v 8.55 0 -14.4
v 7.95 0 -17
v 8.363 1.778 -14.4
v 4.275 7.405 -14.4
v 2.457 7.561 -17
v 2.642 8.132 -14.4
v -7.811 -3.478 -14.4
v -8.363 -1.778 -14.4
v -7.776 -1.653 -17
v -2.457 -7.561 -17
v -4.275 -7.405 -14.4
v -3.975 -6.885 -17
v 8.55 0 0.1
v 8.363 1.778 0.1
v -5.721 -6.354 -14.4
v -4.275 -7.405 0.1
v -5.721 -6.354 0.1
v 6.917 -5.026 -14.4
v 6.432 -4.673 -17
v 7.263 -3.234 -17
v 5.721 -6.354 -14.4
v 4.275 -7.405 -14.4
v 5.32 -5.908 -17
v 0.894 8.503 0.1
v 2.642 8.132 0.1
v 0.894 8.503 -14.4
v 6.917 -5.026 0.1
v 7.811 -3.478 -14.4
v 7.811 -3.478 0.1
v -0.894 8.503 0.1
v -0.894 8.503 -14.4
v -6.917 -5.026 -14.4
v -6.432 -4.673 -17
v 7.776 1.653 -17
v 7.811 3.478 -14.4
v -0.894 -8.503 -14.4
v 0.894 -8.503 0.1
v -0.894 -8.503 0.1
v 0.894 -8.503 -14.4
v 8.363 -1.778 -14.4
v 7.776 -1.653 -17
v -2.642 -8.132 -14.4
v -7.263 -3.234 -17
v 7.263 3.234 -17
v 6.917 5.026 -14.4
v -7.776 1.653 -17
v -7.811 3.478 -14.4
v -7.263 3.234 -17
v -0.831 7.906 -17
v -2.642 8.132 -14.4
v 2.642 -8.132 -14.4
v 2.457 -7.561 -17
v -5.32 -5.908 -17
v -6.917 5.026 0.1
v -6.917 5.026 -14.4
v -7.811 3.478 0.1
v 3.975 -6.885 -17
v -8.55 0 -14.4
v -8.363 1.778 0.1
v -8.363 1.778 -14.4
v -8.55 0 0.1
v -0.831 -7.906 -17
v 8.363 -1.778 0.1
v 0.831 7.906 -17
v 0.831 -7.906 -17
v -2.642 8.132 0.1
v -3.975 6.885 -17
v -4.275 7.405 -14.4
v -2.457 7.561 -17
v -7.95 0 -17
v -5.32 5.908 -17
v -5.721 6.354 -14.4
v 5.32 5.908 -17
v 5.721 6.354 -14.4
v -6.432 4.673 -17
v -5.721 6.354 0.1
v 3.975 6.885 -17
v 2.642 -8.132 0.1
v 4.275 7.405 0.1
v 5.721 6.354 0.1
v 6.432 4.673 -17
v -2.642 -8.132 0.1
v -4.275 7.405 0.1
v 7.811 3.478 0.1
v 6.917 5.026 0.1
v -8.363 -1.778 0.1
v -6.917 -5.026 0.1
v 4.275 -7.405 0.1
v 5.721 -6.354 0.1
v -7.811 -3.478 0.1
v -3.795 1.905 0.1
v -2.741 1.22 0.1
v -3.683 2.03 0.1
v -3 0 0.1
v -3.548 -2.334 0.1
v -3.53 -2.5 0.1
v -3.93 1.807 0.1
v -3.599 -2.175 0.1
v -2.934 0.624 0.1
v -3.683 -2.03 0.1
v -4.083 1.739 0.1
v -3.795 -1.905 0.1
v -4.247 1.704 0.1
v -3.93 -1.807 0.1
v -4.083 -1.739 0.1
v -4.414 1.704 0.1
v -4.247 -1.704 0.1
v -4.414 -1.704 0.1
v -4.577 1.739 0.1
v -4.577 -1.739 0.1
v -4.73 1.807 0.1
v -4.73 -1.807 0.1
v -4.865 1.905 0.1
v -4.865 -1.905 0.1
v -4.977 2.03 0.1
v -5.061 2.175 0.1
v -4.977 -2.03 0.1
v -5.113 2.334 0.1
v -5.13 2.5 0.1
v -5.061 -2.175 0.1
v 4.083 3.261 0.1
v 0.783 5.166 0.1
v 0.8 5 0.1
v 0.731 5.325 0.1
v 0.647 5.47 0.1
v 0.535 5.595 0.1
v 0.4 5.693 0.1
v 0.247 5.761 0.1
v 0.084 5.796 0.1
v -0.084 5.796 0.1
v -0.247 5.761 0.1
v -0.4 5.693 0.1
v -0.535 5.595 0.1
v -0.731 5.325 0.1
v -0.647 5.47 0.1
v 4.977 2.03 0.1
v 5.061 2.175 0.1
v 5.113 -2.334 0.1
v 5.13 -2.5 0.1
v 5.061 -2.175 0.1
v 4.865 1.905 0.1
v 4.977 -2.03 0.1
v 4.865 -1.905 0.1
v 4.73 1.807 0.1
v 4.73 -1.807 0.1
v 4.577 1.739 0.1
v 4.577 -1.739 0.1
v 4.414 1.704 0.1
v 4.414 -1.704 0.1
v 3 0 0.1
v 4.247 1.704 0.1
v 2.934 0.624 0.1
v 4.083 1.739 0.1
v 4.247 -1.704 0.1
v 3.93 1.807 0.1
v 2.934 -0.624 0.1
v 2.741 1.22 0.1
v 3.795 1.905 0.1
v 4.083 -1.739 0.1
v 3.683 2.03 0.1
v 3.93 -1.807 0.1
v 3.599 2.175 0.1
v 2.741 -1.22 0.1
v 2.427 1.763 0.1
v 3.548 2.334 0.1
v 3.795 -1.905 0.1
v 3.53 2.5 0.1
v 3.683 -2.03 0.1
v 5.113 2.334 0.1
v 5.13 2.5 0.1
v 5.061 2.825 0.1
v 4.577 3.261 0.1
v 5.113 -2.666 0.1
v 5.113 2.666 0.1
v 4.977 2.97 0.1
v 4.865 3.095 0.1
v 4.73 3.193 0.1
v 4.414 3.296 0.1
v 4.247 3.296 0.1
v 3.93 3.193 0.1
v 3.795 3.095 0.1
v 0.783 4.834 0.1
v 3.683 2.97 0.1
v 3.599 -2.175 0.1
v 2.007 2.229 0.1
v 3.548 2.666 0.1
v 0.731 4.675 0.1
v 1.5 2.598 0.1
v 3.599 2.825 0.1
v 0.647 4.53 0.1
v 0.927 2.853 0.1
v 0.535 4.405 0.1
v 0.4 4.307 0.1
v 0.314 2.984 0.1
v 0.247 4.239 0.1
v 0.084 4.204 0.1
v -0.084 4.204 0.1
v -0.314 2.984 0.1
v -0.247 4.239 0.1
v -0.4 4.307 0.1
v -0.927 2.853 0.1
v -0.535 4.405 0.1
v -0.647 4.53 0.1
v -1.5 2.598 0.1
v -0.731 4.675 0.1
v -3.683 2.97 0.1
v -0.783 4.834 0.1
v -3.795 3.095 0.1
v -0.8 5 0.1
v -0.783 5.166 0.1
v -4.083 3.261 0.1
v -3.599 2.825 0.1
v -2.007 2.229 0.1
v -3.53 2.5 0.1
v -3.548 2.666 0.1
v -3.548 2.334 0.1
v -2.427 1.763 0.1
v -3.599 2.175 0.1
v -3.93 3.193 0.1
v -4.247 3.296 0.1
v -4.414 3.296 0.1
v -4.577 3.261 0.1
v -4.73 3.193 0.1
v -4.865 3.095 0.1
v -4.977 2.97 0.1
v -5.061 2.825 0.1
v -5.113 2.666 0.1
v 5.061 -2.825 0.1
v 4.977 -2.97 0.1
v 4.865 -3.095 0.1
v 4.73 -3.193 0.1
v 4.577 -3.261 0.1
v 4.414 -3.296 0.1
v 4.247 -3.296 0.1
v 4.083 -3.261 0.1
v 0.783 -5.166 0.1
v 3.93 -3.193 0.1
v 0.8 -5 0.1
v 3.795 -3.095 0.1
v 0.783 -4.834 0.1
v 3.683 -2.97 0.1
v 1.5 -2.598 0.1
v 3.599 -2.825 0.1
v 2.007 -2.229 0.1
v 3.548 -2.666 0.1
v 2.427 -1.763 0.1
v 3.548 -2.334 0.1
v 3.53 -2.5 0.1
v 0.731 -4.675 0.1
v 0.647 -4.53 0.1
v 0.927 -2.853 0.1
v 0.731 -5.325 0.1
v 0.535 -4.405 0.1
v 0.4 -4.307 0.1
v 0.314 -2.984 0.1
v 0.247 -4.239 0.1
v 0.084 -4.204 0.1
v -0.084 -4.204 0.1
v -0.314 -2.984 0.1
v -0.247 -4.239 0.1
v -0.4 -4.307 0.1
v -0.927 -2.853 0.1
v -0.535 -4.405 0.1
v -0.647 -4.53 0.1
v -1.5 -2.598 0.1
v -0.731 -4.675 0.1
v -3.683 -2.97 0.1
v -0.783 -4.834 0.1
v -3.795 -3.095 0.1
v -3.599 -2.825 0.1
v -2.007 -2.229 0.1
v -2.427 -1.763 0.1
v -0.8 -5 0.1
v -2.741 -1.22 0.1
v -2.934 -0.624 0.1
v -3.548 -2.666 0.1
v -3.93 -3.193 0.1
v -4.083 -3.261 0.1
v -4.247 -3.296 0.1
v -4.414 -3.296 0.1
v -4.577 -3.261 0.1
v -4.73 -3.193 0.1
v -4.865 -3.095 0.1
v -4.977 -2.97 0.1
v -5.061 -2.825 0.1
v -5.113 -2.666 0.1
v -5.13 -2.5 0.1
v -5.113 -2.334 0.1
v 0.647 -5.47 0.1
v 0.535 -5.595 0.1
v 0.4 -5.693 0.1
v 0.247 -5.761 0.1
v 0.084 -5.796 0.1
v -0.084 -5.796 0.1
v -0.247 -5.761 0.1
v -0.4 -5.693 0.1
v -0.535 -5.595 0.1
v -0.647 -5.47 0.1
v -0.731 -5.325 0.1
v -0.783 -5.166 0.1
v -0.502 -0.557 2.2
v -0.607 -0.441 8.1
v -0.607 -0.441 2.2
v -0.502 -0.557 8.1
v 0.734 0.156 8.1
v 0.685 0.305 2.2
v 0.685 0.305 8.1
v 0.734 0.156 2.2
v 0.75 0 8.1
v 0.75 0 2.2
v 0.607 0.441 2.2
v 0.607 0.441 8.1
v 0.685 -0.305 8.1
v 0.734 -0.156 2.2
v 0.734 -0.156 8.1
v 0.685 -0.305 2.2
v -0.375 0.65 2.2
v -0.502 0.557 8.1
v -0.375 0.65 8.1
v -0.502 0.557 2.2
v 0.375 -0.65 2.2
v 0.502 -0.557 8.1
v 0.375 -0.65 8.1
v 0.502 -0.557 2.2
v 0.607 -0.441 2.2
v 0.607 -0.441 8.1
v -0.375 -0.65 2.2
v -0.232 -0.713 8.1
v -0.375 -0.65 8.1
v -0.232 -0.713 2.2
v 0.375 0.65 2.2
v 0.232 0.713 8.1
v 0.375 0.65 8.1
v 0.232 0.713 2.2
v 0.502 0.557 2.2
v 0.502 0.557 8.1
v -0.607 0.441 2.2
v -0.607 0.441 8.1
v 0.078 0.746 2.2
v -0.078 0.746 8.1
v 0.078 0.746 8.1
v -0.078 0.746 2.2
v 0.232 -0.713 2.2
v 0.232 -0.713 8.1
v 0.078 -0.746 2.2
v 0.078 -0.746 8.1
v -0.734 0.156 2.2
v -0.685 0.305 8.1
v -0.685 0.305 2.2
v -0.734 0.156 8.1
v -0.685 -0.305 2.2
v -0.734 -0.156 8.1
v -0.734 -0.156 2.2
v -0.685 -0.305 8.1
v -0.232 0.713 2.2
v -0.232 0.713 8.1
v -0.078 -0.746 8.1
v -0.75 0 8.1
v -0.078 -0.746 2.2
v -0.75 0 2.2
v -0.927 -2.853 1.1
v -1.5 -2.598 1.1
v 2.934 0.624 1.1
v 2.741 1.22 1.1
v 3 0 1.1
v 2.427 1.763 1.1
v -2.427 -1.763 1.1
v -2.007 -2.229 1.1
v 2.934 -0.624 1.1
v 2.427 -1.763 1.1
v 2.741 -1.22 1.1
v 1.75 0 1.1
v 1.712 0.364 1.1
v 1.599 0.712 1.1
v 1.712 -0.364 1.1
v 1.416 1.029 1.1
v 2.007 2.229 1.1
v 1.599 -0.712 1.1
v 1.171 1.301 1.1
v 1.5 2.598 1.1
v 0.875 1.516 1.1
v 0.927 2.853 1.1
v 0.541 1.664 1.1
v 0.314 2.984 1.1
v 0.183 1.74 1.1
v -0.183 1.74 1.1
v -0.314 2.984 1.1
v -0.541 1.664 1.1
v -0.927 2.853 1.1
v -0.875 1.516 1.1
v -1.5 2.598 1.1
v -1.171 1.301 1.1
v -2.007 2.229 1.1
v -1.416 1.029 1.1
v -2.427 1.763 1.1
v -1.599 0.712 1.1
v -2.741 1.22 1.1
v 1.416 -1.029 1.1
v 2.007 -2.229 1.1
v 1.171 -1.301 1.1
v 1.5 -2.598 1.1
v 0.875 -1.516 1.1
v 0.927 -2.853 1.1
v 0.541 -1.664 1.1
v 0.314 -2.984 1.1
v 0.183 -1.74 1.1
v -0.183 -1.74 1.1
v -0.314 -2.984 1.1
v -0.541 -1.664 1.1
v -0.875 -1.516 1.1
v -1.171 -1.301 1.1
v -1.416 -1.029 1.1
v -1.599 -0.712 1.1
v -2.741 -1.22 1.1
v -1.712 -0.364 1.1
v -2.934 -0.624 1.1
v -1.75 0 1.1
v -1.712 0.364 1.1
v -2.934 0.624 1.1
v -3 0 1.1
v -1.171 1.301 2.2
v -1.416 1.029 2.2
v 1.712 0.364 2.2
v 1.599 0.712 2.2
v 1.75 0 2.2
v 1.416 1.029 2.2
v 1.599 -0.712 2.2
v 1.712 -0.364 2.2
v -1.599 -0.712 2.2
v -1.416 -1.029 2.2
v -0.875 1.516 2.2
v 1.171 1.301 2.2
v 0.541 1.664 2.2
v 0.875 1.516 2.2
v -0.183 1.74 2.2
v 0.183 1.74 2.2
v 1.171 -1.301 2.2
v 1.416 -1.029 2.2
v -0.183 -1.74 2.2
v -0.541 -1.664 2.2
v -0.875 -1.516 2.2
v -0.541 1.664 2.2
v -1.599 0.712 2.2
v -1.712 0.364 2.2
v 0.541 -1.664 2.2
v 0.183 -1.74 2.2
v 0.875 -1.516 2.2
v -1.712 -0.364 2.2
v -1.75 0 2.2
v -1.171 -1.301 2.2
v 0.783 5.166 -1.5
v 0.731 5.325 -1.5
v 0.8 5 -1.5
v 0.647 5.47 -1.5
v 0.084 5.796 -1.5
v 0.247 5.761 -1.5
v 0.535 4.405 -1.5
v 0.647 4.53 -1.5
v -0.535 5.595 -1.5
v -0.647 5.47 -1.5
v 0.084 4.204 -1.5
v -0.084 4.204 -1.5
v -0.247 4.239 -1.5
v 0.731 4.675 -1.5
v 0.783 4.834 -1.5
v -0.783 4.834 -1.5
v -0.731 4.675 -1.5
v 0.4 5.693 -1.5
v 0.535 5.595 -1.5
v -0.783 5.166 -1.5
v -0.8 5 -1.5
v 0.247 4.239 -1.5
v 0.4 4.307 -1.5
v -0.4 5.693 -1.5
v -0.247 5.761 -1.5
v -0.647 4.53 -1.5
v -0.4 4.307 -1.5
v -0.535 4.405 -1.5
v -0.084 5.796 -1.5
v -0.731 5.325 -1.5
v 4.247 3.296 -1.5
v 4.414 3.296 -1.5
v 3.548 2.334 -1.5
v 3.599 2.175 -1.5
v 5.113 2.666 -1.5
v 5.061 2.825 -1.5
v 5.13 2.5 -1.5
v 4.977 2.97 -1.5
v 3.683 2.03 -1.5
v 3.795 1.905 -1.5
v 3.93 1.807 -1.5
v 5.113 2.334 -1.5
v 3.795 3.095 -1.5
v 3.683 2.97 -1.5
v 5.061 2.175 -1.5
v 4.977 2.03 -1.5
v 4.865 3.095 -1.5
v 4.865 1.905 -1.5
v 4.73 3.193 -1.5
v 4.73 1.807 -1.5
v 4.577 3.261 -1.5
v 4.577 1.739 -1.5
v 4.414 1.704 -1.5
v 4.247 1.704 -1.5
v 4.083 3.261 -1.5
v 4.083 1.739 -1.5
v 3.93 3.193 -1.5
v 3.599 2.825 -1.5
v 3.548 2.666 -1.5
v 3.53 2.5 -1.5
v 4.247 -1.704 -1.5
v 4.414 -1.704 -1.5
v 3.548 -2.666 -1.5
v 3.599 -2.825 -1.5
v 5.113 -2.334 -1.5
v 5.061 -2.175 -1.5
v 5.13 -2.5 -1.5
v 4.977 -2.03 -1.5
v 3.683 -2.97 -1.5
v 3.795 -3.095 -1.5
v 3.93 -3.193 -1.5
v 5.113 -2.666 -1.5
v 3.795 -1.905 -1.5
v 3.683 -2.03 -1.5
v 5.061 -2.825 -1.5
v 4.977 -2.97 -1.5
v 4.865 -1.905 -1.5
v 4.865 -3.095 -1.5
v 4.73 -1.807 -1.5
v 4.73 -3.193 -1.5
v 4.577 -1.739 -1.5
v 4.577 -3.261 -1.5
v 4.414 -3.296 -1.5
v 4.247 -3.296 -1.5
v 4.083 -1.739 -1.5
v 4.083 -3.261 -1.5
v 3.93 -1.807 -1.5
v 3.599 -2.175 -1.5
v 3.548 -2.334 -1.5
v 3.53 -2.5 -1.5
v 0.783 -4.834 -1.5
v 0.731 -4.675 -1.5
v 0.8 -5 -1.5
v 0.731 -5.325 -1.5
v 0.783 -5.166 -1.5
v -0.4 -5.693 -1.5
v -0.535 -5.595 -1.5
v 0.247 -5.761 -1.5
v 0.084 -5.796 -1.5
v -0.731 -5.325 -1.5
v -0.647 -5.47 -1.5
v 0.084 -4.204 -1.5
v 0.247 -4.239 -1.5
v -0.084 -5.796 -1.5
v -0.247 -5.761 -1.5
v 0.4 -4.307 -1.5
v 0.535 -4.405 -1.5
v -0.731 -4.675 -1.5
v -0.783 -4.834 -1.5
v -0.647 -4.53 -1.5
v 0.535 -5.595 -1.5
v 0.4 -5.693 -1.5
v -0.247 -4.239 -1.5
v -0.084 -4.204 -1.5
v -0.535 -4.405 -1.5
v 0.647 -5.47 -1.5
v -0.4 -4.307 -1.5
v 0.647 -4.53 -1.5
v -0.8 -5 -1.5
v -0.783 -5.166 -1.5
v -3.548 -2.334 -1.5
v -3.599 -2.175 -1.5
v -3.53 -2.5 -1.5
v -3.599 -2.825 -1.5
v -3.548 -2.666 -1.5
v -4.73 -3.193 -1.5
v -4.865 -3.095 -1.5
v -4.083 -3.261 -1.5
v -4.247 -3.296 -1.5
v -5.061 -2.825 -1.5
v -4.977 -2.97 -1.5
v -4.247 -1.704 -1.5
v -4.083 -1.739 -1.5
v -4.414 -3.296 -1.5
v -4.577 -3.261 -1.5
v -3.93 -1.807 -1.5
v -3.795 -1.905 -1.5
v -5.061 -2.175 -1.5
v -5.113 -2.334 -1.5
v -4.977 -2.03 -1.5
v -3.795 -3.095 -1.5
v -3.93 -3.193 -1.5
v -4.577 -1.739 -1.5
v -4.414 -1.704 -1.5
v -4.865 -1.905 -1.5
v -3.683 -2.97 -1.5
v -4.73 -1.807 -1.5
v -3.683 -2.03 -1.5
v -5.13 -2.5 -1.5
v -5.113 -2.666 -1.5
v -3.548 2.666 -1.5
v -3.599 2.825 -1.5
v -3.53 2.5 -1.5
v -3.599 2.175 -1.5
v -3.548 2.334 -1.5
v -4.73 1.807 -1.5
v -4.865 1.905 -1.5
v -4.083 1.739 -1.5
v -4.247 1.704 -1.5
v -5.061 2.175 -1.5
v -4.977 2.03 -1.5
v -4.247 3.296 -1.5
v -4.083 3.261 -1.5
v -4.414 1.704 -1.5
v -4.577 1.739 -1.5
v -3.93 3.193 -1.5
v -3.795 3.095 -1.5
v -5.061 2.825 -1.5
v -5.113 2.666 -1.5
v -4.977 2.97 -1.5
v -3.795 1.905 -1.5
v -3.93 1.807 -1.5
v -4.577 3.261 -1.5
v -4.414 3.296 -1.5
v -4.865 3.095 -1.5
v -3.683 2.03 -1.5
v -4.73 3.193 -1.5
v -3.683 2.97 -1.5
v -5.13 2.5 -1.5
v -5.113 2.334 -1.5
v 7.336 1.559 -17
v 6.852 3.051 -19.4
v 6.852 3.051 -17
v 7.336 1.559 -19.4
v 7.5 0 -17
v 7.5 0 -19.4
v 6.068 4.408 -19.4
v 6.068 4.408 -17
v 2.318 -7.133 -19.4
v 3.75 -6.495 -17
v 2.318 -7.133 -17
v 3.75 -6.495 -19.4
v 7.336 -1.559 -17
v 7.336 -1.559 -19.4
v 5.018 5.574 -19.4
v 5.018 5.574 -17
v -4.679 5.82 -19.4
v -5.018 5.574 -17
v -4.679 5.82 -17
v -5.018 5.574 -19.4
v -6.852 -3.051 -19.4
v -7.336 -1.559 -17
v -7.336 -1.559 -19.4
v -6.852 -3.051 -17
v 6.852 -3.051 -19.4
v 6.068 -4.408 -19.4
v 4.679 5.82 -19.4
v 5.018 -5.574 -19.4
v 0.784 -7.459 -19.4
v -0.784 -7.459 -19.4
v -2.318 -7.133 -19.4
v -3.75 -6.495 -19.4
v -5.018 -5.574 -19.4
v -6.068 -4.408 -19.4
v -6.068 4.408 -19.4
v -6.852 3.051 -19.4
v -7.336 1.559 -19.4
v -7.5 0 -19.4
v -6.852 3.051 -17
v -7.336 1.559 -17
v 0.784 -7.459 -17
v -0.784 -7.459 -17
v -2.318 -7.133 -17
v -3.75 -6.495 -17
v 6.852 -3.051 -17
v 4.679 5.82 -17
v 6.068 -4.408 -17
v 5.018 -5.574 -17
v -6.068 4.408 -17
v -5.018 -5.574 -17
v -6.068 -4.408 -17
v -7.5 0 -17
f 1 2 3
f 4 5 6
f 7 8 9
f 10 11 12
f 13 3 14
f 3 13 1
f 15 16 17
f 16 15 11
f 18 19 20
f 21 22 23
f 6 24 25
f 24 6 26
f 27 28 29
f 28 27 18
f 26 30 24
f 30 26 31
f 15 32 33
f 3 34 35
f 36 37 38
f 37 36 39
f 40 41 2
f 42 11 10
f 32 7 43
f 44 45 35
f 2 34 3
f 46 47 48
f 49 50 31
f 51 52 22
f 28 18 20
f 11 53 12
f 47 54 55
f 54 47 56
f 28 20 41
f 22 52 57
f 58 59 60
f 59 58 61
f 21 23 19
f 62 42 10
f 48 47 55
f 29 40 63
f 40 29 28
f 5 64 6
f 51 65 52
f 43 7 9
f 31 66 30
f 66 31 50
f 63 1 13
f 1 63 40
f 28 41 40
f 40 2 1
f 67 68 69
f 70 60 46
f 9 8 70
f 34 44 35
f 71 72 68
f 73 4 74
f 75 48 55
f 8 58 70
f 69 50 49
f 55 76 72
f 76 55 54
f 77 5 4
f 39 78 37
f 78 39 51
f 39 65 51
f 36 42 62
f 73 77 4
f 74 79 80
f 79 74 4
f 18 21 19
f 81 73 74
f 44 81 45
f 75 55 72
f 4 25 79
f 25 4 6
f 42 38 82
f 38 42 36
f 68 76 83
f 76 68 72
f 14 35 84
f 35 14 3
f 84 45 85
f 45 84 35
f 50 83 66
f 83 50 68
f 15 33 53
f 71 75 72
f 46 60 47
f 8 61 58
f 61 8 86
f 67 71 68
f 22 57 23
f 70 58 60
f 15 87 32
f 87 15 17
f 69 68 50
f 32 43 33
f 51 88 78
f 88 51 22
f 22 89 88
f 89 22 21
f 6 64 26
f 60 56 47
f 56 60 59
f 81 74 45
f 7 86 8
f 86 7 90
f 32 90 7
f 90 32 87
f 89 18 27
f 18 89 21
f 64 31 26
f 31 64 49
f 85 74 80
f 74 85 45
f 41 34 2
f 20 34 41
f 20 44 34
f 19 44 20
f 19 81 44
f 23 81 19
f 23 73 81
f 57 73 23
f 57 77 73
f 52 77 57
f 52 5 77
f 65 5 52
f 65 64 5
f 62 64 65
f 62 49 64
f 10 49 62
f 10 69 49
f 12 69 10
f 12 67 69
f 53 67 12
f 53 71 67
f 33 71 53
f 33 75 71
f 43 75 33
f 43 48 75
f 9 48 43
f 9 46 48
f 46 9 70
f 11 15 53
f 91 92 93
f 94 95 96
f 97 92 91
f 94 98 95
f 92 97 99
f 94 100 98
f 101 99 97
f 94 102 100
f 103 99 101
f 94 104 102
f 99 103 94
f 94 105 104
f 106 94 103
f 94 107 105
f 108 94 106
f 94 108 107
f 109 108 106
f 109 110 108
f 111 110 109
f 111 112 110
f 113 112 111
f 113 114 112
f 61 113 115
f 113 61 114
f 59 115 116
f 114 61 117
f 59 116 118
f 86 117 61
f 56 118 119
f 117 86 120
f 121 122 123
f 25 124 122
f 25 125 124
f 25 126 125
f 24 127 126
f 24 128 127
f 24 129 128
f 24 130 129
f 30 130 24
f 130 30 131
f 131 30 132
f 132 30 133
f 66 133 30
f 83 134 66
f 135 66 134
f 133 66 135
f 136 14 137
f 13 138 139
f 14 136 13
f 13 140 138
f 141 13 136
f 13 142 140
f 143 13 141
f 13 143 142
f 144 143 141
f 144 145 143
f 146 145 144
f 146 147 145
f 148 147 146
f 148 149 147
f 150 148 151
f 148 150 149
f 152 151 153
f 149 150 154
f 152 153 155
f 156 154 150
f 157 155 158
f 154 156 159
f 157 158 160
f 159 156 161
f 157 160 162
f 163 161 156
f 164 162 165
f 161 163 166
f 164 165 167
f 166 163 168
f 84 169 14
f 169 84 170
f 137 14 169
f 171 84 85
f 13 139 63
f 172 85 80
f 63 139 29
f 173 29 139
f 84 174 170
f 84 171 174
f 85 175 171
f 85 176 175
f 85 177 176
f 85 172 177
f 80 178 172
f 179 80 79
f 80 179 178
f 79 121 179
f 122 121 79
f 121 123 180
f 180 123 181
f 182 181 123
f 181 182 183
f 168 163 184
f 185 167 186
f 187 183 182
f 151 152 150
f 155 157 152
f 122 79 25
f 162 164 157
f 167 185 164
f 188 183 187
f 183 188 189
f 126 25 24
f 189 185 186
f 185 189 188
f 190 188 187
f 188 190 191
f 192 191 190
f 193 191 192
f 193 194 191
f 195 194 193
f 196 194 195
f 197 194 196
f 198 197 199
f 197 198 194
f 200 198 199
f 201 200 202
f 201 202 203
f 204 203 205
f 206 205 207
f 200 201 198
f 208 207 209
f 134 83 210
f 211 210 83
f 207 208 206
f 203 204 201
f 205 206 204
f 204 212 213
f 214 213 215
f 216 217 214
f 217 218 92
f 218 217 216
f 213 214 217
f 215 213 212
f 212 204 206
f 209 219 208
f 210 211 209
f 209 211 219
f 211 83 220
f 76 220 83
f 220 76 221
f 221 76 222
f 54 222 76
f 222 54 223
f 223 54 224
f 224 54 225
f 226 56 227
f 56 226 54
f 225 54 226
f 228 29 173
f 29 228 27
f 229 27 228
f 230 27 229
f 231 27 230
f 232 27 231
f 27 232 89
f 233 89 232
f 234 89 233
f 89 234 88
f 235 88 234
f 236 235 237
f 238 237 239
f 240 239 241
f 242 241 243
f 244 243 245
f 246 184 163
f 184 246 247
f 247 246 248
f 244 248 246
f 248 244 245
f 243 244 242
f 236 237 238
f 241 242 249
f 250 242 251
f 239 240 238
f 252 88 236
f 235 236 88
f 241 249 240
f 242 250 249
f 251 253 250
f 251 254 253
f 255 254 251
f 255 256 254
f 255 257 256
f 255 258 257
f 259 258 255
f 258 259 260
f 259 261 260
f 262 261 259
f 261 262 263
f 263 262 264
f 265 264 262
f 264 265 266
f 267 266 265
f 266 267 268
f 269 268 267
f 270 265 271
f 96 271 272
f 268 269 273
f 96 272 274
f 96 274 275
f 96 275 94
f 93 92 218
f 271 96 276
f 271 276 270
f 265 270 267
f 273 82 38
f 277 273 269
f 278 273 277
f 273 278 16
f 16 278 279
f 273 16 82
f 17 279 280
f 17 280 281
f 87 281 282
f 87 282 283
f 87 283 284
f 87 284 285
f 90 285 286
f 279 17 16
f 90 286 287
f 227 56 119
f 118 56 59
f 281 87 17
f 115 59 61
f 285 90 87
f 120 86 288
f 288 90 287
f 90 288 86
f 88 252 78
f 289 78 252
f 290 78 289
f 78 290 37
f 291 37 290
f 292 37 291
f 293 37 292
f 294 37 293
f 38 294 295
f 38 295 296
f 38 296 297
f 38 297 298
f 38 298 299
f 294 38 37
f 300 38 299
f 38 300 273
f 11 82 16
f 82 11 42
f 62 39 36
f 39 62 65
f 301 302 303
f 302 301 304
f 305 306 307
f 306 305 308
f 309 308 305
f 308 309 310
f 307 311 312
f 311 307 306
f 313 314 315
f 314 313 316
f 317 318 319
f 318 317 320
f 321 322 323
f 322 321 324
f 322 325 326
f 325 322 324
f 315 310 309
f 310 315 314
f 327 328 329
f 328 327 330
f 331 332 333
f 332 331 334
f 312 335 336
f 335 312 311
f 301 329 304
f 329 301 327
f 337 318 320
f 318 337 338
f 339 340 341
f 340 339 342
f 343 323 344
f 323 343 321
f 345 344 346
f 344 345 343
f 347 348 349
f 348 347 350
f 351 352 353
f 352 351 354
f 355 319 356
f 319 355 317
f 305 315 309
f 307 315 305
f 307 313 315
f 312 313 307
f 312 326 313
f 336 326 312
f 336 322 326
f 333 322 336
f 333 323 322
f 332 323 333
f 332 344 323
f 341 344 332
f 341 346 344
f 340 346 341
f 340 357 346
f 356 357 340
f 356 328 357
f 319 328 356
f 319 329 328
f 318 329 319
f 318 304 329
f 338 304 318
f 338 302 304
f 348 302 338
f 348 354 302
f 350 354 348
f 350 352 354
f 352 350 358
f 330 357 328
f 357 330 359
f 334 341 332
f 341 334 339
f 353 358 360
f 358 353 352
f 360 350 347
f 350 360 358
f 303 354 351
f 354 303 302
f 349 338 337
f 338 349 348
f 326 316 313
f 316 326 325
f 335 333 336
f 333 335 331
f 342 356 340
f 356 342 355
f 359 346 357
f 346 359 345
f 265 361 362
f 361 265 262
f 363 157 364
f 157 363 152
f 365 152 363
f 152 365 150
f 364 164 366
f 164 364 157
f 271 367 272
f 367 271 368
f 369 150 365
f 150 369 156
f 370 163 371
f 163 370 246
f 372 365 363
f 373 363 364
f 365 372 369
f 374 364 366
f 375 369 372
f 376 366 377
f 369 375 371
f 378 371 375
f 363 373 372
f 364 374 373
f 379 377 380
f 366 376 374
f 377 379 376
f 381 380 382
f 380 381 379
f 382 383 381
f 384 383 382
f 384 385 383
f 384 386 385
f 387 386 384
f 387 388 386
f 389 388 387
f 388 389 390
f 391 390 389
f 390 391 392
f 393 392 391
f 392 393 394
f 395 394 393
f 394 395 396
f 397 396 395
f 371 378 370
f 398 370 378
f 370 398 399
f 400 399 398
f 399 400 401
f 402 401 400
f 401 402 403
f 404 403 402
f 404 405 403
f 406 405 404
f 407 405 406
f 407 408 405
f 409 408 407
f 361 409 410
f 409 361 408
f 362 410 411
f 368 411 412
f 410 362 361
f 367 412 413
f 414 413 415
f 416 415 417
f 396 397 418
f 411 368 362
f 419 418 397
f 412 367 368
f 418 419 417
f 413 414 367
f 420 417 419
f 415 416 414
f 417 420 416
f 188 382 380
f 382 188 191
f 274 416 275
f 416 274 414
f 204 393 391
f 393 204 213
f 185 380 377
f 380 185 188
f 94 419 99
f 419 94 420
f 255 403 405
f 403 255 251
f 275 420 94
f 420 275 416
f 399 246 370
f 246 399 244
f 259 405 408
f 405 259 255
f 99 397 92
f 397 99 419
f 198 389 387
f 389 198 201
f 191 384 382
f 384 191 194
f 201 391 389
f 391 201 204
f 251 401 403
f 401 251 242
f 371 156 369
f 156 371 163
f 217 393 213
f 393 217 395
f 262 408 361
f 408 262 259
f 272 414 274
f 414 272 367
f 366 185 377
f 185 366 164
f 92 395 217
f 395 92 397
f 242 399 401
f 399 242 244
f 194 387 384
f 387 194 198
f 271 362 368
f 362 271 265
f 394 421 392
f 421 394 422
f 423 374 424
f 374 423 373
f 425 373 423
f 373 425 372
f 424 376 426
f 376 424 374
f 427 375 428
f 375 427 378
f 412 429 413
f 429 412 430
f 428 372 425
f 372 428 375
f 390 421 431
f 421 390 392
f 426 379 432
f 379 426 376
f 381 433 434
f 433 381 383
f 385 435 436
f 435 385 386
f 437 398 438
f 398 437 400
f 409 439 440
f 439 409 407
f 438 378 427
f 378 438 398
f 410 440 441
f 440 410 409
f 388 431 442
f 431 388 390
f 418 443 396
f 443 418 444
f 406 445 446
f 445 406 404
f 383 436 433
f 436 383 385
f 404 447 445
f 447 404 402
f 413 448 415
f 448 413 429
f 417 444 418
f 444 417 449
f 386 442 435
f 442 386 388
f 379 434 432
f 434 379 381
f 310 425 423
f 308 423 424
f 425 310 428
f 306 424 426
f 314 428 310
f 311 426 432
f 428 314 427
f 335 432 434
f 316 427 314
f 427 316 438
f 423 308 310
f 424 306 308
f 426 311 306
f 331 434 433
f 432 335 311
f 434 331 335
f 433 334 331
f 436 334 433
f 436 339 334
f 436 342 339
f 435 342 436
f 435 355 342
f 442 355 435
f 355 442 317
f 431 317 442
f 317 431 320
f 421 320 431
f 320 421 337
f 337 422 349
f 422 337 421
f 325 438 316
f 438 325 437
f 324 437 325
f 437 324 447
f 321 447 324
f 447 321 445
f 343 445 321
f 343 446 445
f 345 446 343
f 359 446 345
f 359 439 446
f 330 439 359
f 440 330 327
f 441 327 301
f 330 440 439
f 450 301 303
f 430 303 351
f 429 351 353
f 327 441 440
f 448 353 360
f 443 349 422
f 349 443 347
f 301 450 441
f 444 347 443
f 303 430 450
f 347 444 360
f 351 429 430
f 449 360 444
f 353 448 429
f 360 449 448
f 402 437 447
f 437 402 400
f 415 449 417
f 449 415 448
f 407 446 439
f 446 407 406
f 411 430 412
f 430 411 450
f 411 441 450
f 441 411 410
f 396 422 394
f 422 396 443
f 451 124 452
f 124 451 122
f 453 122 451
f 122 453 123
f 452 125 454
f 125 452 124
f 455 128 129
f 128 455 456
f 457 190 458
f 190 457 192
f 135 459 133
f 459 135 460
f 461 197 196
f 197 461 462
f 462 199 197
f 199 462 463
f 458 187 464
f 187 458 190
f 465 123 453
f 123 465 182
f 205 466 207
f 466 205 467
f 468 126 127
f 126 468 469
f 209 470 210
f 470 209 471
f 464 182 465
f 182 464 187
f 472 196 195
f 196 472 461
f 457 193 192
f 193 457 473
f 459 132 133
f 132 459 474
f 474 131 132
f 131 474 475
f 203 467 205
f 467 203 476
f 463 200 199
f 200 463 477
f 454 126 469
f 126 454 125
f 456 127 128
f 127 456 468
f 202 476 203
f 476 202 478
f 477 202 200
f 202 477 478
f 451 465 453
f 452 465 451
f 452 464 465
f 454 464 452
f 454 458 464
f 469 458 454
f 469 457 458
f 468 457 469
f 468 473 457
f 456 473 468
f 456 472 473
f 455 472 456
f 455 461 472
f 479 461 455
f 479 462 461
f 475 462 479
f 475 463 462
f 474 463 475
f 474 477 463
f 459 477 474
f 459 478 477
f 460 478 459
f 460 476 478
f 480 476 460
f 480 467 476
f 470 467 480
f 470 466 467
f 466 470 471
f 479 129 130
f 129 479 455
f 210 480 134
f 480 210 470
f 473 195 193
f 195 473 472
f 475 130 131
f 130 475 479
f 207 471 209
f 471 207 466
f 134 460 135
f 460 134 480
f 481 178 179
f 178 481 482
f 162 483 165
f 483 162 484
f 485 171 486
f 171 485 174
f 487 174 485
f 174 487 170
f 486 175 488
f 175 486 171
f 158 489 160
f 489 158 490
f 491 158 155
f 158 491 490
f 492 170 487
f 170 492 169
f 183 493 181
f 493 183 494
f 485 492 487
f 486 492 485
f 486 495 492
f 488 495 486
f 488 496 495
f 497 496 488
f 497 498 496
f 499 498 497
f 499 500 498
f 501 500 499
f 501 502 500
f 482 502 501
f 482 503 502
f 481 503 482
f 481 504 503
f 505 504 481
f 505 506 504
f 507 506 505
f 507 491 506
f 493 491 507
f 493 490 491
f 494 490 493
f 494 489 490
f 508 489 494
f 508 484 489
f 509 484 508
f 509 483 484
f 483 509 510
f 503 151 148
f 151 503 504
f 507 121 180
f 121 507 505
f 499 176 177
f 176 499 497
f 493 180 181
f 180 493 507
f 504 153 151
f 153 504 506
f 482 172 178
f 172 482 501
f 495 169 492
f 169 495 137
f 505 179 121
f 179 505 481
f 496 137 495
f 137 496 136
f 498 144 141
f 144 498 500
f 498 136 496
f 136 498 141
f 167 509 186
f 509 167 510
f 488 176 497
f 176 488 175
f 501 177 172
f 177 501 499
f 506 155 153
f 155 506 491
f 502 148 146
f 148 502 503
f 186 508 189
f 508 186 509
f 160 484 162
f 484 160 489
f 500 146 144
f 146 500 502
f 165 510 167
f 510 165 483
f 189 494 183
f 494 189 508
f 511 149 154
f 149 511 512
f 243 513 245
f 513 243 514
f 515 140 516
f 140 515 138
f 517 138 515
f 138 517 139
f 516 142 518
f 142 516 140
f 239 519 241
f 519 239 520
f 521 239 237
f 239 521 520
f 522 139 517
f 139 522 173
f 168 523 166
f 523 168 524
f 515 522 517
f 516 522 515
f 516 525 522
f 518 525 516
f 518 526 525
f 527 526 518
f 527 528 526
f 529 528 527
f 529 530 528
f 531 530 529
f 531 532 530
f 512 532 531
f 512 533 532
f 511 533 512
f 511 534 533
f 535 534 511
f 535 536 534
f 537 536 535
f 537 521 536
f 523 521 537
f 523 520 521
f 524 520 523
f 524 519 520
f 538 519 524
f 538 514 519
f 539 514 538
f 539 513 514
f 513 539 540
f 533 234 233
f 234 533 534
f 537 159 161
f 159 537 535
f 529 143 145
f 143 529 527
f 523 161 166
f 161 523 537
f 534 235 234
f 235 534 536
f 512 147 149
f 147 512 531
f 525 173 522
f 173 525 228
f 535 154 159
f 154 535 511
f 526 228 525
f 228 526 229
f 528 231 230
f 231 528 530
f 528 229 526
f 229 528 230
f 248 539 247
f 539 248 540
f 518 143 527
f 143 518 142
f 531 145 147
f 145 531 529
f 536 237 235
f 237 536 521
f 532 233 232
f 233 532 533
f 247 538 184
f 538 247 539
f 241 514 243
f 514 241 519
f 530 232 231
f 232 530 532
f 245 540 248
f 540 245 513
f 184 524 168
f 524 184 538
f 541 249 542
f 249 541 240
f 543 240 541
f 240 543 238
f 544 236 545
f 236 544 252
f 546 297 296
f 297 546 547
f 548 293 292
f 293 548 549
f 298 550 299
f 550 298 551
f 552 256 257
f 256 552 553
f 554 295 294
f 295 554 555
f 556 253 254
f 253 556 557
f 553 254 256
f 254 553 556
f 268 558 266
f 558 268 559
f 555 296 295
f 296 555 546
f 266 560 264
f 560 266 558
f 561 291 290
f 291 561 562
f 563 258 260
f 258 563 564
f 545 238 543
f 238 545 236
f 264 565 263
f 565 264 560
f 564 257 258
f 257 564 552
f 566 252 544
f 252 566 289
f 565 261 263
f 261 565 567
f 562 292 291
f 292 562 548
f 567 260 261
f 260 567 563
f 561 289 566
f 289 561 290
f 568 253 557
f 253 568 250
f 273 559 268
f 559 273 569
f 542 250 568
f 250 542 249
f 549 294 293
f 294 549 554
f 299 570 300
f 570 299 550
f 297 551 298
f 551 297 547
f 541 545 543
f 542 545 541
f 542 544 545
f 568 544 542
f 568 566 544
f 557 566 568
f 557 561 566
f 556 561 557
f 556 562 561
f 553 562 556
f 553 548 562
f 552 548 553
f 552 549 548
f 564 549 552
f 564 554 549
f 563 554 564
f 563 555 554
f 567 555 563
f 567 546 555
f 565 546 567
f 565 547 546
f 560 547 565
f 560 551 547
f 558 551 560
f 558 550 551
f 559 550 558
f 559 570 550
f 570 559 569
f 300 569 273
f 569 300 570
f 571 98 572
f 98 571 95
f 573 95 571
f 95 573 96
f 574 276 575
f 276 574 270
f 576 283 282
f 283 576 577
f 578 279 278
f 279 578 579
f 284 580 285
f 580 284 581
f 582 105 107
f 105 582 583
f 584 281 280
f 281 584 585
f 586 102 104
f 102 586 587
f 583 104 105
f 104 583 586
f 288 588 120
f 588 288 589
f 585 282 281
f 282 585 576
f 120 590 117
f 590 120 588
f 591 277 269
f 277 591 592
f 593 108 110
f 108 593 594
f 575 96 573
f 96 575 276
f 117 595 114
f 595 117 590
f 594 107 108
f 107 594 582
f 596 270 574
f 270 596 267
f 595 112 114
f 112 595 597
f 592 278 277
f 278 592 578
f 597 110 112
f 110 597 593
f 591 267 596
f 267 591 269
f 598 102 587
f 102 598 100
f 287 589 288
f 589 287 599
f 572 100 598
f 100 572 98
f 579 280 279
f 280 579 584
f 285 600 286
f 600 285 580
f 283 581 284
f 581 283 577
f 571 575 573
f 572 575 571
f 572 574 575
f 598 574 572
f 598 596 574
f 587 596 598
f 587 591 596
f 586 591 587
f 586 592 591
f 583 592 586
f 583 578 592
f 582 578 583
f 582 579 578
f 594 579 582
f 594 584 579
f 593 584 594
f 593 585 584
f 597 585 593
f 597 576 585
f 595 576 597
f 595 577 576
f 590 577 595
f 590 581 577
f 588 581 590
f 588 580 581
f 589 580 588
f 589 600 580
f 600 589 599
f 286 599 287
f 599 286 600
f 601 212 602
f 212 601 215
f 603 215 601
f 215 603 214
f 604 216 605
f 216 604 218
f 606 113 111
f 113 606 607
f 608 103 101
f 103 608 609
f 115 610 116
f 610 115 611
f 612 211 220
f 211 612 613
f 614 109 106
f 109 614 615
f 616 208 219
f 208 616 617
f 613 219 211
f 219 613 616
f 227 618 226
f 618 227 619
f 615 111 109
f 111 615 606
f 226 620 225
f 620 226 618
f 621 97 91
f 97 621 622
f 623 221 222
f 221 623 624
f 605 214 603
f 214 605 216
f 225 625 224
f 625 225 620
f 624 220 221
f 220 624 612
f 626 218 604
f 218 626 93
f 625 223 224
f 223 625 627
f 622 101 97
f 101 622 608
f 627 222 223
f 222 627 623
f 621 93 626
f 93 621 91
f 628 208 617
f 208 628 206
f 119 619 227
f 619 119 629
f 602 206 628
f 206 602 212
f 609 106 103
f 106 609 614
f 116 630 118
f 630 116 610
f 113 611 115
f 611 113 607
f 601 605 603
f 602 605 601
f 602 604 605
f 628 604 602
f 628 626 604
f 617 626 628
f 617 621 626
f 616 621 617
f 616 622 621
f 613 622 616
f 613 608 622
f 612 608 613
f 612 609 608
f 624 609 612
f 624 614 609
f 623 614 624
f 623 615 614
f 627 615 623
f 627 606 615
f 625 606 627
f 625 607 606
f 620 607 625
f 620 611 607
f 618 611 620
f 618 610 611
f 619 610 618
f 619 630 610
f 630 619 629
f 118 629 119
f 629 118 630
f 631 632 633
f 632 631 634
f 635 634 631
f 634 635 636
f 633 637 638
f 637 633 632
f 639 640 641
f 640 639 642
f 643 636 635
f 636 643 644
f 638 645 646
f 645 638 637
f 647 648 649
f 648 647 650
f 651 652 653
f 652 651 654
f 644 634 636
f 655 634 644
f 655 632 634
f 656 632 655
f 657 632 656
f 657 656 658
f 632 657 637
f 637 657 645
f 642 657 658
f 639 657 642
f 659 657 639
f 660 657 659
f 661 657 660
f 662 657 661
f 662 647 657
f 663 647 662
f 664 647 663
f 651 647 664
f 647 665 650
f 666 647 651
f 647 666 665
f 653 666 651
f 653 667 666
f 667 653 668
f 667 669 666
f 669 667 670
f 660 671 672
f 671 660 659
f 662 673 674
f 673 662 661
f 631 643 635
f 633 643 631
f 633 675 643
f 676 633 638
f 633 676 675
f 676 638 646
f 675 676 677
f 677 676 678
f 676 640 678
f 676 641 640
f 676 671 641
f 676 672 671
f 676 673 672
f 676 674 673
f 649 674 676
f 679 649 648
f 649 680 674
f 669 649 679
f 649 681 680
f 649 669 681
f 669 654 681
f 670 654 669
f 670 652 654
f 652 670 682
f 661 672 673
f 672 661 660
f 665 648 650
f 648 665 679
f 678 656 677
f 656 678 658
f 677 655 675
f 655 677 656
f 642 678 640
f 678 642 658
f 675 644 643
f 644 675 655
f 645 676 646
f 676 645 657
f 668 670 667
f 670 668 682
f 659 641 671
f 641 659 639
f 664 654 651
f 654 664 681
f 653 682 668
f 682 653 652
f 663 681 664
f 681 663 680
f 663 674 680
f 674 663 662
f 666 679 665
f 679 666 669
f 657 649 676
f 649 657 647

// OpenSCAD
//motor 1717 modeling
//encoder
//https://www.shinkoh-faulhaber.jp/JP_data_edition_2020/JP_IEH2-4096_DFF.pdf
//https://www.shinkoh-faulhaber.jp/products/series/1717sr
//Author Y.Nakagawa
//Date: 2024/12/07
//revised: 2025/1/10

motor1717(0);
//motor1717(5);
//connector1717();
//encoder1717();
//motor1717_screwhole();


module motor1717(rotate){
  translate([0,0,-17])rotate([0,0,rotate])motor1717_body();
  rotate([0,0,0])translate([0,0,-17-2.4]) encoder1717();
}

module motor1717_body(){
  $fs = 0.01;
  mr1 = 17.1/2; //mm motor radius //モーター半径
  mr2 = 15.9/2; //mm motor 肩のスボミの径
  mh1 =14.5; //mm motor length //モーターのスボミまでの長さ
  mh2 =17.1-mh1; //mm motor length //モーターのスボミの長さ
  axr =1.5/2; //mm motor axis radius //モーター軸の半径
  axl = 8; //mm motor axis length //モーター軸の長さ
  axl2 = 6; //mm 使わないが、軸が出てる長さは6㎜
  cr1 = 6/2; //mm motor center sholder big radius
  cr2 = 3.5/2; //mm motor center sholder small radius
  ch1 = 1; //mm from motor 
  ch2 = 2.1; //mm from motor

  difference(){
  union(){
    color("black")
      hull(){
        translate([0,0, mh2]) cylinder(h=mh1, r=mr1);
        translate([0,0,0]) cylinder(h=mh1, r=mr2);
      }
      color("whitesmoke")translate([0,0,mh1+mh2])cylinder(h=axl, r=axr);
      translate([0,0,mh1+mh2])cylinder(h=ch1, r=cr1);
      translate([0,0,mh1+mh2])cylinder(h=ch2, r=cr2);
  }
    translate([0,0,mh1+mh2-1.6]) motor1717_screwhole();
  }
}

module motor1717_screwhole(){
  //M1.6x1.6mm
  $fs=0.01;
  rcircle = 5; //同心円の半径
  height = 0; //中心からの距離
  sh = 1.6; // ネジの長さ
  sr = 0.8; // ネジ穴の半径 M1.6

  for(angle=[0:60:360]){
      translate([rcircle*sin(angle),rcircle*cos(angle),height]) cylinder(h=1.6+1, r=0.8);
  }
}

module encoder1717(){
  $fs=0.01;
  eh = 2.4; //mm encoder height
  er = 15/2; //mm encoder radius
  el = 15-13.32; //mm encoder luck
  ed = 15;

  color("black")
  difference(){
    cylinder(h=eh, r=er);
    translate([-er,er-el,-1])cube([ed+2, ed+2, eh+2]);
  }
    
}
